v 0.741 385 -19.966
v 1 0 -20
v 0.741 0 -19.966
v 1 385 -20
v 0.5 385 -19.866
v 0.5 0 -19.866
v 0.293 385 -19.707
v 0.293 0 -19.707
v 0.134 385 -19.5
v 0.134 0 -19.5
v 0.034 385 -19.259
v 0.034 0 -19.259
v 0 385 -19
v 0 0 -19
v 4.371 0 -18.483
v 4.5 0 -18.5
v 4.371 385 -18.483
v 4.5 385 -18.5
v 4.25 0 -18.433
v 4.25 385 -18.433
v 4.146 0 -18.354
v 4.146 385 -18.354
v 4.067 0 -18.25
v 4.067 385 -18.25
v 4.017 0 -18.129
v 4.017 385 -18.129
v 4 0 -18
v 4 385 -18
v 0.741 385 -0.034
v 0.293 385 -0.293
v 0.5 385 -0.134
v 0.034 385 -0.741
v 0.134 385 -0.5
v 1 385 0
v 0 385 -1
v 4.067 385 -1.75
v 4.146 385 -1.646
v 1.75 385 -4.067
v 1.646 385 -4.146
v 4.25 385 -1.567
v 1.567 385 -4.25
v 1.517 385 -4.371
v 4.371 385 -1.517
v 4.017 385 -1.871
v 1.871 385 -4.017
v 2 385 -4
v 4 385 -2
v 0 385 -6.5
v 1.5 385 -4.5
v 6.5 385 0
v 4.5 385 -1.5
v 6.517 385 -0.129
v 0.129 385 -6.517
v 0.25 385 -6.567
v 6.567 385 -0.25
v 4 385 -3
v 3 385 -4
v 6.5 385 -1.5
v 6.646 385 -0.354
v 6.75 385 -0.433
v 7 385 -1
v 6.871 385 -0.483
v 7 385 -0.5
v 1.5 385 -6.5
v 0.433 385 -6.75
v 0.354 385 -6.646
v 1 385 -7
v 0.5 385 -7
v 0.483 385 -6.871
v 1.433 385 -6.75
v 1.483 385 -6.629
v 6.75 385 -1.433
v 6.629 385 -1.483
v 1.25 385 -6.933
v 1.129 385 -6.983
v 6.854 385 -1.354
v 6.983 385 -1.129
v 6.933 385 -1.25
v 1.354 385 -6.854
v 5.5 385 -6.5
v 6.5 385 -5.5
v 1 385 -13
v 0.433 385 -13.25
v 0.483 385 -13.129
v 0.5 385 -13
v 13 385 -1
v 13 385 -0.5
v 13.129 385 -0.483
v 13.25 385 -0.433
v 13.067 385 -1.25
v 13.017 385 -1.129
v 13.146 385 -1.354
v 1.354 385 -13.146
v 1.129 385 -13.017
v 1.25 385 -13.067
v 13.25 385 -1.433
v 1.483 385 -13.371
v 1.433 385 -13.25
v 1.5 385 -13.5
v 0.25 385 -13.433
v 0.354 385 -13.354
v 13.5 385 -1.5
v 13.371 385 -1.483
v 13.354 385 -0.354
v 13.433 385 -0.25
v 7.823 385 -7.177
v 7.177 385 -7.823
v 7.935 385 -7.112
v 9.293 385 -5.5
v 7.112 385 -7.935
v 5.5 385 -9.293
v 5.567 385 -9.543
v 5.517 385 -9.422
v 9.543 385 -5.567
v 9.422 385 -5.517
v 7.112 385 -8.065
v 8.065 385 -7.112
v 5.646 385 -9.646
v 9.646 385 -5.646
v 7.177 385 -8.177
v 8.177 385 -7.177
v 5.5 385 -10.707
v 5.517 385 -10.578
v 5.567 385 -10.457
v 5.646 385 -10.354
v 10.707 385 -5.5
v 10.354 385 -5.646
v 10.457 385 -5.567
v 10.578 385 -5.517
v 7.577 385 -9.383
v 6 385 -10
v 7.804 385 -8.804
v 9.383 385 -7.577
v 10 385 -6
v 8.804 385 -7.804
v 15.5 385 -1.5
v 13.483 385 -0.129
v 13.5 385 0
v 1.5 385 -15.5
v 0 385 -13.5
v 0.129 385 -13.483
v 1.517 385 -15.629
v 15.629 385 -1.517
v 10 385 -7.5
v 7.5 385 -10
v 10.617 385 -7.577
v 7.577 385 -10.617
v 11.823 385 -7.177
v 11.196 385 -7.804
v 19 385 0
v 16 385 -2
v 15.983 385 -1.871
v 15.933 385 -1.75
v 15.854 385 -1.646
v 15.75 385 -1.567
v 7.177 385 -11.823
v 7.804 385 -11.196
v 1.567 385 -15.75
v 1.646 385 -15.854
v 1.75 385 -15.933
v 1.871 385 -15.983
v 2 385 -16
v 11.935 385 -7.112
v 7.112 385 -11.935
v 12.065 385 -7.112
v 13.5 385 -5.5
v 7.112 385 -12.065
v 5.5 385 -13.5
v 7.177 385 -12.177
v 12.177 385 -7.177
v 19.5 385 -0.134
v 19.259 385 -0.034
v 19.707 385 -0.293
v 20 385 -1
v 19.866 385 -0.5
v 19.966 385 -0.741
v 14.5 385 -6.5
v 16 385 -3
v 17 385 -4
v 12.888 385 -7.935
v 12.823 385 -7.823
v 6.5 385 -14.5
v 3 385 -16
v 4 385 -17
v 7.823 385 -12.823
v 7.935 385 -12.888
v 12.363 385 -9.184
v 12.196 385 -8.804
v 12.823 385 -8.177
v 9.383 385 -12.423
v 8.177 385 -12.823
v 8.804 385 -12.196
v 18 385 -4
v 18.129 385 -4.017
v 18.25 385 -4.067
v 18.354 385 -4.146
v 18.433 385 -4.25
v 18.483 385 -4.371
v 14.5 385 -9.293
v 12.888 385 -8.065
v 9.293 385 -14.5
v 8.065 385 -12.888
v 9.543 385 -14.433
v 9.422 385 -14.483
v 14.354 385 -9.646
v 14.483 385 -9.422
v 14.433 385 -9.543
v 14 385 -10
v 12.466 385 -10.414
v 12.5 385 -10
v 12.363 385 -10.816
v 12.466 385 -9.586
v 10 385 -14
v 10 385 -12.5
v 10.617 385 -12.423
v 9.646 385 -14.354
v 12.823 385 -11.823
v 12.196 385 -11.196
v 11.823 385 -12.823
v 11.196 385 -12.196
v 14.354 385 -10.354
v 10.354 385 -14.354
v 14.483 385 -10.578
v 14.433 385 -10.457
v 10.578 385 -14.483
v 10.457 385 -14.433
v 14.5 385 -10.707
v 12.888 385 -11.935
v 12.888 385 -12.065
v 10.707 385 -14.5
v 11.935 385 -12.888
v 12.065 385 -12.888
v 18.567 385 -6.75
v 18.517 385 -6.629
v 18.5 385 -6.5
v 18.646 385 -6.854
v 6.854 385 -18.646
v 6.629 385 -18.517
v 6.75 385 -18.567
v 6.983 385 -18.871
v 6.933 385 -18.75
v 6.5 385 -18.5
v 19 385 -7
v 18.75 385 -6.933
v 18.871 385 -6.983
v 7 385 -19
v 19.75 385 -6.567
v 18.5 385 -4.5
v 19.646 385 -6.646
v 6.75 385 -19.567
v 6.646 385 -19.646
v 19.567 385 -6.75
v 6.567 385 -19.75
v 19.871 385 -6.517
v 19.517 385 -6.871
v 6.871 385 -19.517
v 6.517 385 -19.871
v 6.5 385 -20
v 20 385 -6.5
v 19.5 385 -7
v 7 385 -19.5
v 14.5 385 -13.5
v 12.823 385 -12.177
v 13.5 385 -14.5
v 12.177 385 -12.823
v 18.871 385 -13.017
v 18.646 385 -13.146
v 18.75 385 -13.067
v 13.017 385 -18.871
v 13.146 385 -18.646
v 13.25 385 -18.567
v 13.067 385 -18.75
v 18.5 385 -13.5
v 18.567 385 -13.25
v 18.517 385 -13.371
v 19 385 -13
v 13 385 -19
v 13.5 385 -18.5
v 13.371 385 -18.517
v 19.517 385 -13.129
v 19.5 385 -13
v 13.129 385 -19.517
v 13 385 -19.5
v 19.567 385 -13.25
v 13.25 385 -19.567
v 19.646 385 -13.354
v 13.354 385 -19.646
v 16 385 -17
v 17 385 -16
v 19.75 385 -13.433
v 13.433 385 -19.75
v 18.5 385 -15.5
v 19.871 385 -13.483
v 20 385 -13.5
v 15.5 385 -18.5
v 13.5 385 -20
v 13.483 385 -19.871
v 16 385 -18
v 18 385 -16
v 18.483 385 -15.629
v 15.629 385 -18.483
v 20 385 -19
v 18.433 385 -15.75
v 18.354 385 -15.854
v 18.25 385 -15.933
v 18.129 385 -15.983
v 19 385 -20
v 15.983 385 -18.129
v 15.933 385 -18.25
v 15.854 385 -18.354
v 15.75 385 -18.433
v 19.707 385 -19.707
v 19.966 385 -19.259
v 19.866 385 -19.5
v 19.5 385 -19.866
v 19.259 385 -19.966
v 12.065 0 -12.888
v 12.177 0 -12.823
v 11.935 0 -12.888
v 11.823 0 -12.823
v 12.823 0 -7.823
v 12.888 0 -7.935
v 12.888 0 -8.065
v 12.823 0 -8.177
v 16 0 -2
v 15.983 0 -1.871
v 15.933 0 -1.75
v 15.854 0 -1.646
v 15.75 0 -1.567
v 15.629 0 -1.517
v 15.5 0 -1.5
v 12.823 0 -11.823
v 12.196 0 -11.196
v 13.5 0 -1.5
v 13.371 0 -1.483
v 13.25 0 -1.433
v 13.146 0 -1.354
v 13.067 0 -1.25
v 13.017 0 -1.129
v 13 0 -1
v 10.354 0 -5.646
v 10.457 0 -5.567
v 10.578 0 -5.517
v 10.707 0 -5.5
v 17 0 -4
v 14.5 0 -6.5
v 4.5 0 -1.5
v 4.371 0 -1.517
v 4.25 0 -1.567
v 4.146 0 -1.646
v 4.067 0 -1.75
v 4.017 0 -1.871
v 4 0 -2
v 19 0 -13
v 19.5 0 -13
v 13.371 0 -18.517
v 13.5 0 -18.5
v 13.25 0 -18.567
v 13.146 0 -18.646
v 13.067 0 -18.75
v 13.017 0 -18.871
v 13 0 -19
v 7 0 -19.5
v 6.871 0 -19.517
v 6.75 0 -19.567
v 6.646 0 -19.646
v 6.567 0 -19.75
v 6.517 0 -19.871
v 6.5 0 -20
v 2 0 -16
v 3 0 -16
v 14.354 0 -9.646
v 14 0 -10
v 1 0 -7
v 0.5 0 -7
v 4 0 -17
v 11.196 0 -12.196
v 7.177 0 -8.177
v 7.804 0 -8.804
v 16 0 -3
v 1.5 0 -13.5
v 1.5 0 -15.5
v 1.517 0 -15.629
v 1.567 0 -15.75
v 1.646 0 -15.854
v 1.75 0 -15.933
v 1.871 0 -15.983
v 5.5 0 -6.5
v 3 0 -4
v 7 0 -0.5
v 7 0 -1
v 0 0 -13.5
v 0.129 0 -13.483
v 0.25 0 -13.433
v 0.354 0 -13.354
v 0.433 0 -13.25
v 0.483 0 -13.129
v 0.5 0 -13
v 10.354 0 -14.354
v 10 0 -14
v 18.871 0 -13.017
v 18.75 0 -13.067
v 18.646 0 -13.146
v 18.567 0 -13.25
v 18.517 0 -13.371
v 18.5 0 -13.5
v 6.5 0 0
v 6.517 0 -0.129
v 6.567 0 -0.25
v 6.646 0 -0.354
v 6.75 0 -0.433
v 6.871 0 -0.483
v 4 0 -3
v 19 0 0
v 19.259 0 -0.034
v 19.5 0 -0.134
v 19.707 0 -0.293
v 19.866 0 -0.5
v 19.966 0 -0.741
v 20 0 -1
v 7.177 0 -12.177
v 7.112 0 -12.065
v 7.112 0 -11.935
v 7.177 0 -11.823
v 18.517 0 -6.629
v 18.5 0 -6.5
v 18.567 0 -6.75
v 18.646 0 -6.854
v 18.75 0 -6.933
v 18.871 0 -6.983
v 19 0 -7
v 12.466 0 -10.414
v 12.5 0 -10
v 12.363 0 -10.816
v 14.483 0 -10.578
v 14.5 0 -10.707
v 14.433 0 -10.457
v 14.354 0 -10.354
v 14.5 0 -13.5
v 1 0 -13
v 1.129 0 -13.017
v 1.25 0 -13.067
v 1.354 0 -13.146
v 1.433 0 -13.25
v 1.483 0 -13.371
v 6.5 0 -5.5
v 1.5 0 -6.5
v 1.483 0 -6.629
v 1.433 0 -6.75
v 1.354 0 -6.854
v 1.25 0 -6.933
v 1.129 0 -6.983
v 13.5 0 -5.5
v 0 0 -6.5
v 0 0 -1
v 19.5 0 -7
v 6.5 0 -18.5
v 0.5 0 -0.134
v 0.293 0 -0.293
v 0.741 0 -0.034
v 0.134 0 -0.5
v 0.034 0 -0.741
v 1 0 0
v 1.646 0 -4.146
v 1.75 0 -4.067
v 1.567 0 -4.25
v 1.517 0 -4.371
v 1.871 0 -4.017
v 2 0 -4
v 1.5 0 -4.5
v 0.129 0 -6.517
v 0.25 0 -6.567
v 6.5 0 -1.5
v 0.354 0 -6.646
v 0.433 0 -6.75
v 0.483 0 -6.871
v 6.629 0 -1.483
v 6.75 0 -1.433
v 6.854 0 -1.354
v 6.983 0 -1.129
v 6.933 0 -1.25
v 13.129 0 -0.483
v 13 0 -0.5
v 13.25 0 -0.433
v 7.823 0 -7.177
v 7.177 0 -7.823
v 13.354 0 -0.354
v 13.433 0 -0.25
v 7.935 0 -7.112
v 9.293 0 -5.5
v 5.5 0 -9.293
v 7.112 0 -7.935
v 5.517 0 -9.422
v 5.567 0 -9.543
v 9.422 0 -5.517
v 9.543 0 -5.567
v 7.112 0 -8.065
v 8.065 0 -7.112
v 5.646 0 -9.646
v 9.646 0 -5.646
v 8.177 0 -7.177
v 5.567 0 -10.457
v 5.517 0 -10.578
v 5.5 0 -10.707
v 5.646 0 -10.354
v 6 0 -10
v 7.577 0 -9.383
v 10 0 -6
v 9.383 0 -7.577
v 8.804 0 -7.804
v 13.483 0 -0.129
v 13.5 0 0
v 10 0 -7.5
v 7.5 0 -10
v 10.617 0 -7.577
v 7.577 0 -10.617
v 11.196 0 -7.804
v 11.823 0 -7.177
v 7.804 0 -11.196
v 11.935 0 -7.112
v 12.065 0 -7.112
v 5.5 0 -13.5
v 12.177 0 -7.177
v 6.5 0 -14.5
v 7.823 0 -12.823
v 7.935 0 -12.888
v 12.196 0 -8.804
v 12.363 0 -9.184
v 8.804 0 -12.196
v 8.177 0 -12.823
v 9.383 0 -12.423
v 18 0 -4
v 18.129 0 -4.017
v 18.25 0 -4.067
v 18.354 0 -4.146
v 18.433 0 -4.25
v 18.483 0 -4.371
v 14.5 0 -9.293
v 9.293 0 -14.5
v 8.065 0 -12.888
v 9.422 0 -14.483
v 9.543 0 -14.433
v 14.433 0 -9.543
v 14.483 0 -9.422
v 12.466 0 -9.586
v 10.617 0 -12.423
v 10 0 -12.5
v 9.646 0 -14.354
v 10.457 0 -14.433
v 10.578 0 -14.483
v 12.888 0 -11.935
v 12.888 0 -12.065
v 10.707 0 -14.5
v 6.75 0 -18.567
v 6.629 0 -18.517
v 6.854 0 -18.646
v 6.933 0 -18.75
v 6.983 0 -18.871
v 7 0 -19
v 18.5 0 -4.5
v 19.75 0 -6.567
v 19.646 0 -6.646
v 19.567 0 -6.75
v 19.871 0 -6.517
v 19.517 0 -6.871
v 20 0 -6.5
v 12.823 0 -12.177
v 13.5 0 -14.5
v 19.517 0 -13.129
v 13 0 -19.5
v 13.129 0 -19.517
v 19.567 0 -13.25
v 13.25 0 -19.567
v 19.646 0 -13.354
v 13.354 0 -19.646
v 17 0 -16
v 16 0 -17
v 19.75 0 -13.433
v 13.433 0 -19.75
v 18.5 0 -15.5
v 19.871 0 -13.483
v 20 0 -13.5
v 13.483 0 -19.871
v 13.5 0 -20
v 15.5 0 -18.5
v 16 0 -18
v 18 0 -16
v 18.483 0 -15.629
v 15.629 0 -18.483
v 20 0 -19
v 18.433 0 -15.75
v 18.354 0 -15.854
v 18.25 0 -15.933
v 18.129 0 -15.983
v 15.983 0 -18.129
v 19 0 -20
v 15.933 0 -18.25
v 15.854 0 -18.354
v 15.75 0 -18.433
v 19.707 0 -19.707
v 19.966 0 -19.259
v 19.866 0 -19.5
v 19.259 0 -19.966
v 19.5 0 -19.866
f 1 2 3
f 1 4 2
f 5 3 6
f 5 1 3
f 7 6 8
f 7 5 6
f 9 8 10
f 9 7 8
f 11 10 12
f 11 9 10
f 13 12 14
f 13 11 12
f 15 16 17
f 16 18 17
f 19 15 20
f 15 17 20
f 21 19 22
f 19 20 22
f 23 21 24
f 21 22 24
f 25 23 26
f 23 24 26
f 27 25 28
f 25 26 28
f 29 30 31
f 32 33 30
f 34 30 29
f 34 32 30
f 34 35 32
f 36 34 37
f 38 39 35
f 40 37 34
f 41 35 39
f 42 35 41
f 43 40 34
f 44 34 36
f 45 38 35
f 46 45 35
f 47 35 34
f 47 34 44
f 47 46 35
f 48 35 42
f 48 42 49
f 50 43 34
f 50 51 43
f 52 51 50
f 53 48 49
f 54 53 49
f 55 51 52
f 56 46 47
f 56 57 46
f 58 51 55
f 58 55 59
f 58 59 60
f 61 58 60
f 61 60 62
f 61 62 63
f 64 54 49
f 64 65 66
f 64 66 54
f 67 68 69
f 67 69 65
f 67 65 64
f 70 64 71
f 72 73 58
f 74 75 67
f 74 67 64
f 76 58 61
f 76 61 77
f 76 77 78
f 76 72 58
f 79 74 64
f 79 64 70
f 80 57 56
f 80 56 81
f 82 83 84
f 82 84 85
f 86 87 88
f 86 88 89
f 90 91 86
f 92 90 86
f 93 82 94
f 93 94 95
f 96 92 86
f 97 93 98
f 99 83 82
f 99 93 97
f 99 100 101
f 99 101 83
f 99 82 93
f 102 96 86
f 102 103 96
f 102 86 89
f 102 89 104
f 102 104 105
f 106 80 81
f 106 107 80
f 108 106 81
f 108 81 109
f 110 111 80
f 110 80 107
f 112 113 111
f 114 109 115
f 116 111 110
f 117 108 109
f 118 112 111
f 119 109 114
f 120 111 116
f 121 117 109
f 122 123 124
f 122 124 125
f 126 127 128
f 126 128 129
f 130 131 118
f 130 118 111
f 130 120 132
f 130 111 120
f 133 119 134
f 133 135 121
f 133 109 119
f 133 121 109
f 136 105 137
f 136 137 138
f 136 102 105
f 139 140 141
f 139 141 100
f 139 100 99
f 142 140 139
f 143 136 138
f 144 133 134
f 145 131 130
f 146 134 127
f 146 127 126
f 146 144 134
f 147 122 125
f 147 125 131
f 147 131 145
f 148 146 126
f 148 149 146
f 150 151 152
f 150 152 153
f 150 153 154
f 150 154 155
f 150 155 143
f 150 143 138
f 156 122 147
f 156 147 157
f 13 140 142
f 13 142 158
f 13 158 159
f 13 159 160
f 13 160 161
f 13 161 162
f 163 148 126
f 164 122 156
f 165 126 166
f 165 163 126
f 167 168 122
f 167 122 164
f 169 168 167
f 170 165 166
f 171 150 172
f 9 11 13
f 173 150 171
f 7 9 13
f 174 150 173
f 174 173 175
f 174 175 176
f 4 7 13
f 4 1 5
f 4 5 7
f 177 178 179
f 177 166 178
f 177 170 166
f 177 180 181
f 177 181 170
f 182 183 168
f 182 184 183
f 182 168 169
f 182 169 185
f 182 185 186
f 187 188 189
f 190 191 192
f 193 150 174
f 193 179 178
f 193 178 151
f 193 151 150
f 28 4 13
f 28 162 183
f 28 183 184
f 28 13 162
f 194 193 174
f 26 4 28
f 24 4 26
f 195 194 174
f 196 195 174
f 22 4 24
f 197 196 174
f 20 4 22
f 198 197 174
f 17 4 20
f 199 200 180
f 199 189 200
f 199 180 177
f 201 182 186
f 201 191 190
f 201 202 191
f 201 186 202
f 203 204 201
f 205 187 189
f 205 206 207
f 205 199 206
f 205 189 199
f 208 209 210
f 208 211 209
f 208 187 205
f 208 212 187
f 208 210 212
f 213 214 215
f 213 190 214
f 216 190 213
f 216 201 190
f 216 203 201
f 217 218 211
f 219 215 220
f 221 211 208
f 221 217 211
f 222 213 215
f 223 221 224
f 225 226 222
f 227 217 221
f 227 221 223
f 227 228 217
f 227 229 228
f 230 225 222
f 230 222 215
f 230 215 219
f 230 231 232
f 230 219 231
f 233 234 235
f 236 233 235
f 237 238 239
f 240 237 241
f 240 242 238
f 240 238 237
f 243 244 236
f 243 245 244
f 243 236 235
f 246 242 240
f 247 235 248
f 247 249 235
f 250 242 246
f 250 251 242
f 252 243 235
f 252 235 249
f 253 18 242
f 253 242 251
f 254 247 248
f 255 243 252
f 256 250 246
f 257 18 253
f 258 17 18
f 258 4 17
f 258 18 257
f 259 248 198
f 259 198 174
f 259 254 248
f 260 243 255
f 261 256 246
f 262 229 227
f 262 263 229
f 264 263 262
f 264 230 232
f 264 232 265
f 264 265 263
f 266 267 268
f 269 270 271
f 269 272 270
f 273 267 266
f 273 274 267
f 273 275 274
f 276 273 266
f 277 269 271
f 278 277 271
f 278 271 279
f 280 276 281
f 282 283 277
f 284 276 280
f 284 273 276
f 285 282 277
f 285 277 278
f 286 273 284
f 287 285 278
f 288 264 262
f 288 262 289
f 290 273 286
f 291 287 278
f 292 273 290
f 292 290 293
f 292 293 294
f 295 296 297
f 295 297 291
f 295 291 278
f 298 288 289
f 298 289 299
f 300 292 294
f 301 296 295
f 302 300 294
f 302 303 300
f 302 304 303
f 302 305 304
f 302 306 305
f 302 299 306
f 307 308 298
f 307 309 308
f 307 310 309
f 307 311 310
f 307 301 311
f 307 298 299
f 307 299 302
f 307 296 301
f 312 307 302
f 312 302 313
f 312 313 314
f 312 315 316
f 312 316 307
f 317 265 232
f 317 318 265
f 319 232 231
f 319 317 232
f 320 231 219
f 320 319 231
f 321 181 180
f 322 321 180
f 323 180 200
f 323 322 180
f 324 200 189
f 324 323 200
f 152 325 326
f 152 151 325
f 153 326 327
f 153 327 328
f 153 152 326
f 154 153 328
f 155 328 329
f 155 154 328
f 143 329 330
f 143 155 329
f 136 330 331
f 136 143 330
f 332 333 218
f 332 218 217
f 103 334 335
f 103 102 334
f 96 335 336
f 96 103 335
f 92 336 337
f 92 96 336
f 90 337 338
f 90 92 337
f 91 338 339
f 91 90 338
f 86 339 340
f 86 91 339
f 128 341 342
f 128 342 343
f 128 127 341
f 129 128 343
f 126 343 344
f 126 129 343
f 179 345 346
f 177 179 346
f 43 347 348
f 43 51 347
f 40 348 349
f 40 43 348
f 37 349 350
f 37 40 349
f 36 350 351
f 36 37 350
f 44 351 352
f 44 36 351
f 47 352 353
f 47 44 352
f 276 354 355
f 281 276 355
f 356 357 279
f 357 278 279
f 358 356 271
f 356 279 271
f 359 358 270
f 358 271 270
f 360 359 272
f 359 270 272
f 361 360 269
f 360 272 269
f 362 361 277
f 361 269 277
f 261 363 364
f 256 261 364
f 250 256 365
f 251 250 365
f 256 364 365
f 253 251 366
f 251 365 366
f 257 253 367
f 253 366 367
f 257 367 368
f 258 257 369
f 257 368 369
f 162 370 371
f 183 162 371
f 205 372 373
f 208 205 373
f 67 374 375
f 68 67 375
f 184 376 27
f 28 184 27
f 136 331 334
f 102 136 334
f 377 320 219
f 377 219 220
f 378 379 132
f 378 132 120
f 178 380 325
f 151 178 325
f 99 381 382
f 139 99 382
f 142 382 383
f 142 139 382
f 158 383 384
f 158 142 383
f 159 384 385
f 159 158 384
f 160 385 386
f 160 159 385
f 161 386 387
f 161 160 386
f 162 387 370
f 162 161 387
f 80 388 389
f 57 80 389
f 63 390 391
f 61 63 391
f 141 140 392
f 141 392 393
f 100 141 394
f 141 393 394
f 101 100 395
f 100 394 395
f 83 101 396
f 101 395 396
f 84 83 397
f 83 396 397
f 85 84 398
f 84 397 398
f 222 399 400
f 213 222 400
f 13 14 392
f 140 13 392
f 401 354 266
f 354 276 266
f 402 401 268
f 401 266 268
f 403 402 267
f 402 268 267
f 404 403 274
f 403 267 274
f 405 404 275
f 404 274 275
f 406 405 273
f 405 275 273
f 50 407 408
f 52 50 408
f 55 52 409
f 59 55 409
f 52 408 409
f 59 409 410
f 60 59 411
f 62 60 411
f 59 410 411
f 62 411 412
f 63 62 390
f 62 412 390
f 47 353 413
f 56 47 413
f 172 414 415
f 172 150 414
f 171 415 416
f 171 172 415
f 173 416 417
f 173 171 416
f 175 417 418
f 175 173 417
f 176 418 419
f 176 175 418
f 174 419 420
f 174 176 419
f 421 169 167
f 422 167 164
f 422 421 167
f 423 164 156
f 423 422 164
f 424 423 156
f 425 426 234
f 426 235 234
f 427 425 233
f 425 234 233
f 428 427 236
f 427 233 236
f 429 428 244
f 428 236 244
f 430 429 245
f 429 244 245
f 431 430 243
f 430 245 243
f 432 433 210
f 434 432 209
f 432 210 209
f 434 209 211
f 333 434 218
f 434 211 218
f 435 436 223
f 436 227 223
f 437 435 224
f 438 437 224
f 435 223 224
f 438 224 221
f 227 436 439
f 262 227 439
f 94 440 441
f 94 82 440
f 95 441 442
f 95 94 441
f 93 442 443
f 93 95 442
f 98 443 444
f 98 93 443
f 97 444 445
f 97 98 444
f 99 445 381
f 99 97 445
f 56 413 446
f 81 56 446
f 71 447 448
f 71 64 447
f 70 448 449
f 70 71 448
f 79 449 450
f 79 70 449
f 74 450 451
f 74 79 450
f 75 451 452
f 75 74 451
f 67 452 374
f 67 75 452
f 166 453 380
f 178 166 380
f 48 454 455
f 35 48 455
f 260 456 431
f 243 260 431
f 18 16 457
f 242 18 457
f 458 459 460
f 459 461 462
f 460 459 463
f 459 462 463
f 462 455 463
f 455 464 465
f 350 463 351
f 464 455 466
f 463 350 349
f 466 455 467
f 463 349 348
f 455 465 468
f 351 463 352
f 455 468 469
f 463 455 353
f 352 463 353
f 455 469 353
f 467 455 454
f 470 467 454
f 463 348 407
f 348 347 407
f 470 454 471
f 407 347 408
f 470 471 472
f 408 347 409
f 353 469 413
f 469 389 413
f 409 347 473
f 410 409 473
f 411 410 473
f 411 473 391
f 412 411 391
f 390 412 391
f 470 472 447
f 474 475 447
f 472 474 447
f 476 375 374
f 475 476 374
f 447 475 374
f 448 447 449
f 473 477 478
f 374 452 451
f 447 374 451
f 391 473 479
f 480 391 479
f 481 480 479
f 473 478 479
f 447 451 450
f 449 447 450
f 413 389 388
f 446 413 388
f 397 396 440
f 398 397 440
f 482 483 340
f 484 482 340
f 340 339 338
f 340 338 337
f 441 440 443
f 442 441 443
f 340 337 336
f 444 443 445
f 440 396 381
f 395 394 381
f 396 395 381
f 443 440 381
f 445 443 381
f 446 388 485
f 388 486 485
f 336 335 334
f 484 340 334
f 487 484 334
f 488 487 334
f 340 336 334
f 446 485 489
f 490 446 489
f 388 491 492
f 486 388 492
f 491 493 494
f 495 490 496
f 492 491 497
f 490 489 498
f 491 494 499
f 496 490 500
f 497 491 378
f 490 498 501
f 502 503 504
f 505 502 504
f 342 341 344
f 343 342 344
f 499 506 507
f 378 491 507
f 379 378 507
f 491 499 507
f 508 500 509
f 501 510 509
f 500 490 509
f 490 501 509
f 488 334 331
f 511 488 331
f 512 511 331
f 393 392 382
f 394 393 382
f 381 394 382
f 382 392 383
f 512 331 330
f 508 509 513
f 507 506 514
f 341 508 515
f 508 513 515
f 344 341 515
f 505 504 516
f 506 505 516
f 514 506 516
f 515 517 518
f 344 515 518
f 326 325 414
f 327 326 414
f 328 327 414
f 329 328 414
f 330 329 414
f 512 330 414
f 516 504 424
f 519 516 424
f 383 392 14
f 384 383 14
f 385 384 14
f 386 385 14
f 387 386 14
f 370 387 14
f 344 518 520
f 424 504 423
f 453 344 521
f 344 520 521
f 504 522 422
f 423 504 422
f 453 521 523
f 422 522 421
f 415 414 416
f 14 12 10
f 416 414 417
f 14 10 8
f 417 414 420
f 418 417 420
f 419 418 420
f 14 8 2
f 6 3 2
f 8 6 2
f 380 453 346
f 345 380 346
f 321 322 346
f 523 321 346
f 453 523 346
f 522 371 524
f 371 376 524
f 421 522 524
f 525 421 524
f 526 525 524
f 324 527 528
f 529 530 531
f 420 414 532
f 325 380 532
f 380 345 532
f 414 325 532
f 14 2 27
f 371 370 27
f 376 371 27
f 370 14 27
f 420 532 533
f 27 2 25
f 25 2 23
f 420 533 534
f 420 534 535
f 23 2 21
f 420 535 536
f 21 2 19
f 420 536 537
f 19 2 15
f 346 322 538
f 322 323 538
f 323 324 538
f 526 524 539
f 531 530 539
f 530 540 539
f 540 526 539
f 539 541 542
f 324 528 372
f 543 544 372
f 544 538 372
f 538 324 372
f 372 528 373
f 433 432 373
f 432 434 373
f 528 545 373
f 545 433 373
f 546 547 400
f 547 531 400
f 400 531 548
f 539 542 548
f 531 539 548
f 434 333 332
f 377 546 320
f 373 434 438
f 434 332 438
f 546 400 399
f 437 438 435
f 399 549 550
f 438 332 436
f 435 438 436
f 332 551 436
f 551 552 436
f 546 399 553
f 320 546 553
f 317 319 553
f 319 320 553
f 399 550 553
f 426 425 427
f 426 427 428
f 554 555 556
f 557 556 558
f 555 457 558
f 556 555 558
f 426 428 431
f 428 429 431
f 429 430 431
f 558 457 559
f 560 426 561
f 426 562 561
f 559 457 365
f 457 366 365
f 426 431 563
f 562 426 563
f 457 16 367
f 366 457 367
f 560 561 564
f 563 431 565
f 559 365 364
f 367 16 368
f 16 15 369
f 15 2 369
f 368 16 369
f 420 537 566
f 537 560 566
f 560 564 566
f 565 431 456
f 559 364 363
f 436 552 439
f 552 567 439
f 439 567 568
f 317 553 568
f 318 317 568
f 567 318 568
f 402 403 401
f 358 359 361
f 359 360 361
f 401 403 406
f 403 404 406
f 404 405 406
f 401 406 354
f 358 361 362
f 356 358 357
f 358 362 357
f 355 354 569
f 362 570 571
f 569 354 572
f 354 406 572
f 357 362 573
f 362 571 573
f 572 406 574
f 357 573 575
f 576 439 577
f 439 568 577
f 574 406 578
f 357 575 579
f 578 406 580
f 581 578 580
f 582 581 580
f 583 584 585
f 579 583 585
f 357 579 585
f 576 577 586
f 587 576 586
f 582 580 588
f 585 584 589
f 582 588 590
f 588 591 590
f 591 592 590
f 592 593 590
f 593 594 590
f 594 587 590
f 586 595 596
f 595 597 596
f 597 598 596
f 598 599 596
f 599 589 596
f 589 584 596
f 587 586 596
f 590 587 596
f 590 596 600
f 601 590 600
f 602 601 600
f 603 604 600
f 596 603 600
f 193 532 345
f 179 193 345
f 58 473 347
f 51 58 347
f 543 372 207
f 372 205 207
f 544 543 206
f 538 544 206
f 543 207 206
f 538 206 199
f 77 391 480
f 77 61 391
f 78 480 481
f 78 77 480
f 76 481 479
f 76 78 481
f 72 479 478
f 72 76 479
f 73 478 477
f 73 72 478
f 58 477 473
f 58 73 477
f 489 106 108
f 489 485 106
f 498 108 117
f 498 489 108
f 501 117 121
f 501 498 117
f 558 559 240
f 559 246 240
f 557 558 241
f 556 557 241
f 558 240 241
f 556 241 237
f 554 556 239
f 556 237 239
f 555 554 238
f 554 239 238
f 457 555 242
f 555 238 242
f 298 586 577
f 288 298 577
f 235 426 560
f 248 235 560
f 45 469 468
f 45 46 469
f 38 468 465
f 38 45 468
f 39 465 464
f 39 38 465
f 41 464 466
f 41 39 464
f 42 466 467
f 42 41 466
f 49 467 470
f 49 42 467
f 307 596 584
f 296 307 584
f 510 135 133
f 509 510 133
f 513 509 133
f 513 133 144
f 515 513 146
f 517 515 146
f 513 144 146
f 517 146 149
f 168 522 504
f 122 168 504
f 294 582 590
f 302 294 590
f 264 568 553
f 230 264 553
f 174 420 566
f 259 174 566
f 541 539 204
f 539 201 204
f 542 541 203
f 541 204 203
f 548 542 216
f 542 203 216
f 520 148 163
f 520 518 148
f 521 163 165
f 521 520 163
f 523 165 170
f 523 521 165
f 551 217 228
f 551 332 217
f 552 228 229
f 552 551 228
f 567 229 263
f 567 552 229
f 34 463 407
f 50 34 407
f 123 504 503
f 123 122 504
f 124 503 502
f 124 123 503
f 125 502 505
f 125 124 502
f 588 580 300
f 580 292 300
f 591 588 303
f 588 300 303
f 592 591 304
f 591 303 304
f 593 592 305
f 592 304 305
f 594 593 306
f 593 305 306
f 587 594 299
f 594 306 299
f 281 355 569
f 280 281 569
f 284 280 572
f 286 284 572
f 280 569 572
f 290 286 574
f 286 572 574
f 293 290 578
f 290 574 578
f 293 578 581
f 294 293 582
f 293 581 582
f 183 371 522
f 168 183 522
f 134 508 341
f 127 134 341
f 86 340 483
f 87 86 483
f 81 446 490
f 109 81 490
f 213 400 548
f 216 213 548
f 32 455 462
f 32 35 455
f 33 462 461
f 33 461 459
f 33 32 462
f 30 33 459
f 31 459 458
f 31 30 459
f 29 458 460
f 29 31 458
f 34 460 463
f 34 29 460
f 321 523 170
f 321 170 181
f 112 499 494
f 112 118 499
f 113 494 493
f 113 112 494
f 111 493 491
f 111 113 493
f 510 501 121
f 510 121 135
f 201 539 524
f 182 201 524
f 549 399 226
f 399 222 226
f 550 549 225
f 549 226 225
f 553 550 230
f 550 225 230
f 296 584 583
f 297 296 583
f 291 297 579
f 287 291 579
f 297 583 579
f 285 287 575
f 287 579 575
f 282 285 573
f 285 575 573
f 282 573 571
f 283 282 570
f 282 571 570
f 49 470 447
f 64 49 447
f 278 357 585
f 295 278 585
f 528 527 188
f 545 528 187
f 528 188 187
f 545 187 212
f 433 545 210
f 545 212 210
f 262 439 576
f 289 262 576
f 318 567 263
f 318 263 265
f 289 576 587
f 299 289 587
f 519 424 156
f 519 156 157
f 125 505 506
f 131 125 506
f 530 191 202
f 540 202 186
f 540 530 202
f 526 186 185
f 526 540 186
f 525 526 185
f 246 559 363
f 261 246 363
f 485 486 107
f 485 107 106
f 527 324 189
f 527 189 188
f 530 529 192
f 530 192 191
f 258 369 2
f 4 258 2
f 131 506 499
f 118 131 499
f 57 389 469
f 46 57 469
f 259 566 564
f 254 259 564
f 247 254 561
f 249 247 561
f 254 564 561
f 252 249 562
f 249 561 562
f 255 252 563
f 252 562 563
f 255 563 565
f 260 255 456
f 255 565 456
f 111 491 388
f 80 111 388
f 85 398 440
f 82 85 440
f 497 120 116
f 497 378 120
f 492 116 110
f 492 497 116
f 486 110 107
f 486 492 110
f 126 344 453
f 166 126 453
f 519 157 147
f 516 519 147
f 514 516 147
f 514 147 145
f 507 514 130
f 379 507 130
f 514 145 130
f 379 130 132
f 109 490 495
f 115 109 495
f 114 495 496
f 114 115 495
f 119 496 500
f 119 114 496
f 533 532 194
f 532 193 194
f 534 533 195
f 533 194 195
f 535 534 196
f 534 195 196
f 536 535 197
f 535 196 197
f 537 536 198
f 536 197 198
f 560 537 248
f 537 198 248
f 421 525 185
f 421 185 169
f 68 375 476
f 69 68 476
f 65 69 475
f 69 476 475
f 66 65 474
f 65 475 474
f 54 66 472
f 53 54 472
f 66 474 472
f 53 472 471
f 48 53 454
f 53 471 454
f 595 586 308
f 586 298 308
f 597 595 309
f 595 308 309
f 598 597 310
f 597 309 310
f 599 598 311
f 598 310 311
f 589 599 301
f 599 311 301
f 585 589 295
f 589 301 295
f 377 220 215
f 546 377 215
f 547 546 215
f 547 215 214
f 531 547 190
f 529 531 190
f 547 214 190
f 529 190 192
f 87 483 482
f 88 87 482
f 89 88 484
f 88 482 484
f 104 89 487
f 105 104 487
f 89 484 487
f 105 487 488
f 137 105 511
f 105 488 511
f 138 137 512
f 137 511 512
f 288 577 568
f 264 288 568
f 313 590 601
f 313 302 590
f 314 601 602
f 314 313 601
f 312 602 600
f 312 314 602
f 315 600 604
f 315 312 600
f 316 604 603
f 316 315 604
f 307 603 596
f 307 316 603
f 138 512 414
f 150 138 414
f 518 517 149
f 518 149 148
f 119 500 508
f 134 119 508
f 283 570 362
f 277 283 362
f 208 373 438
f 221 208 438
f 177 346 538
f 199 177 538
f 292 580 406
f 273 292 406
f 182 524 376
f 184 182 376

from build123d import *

# Parameters (mm, degrees)
BOSS_EXTRUDE1_DEPTH = 385
FILLET1_R           = 1
CUT_EXTRUDE1_DEPTH  = 386
FILLET2_R           = 0.5
FILLET3_R           = 0.25


with BuildPart() as part:
    # Sketch3 → Boss-Extrude1 (new body)
    with BuildSketch(Plane(origin=(0, 0, 0), x_dir=(1, 0, 0), z_dir=(0, 1, 0))):
        with BuildLine():
            Line((7, 18.5), (7, 19.5))
            ThreePointArc((7, 19.5), (6.646446609, 19.646446609), (6.5, 20))
            Line((6.5, 20), (0, 20))
            Line((0, 20), (0, 13.5))
            ThreePointArc((0, 13.5), (0.353553391, 13.353553391), (0.5, 13))
            Line((0.5, 13), (1.5, 13))
            Line((1.5, 13), (1.5, 16))
            Line((1.5, 16), (3, 16))
            Line((3, 16), (5.5, 13.5))
            Line((5.5, 13.5), (5.5, 10.5))
            Line((5.5, 10.5), (6, 10))
            Line((6, 10), (5.5, 9.5))
            Line((5.5, 9.5), (5.5, 6.5))
            Line((5.5, 6.5), (3, 4))
            Line((3, 4), (1.5, 4))
            Line((1.5, 4), (1.5, 7))
            Line((1.5, 7), (0.5, 7))
            ThreePointArc((0.5, 7), (0.353553391, 6.646446609), (0, 6.5))
            Line((0, 6.5), (0, 0))
            Line((0, 0), (6.5, 0))
            ThreePointArc((6.5, 0), (6.646446609, 0.353553391), (7, 0.5))
            Line((7, 0.5), (7, 1.5))
            Line((7, 1.5), (4, 1.5))
            Line((4, 1.5), (4, 3))
            Line((4, 3), (6.5, 5.5))
            Line((6.5, 5.5), (9.5, 5.5))
            Line((9.5, 5.5), (10, 6))
            Line((10, 6), (10.5, 5.5))
            Line((10.5, 5.5), (13.5, 5.5))
            Line((13.5, 5.5), (16, 3))
            Line((16, 3), (16, 1.5))
            Line((16, 1.5), (13, 1.5))
            Line((13, 1.5), (13, 0.5))
            ThreePointArc((13, 0.5), (13.353553391, 0.353553391), (13.5, 0))
            Line((13.5, 0), (20, 0))
            Line((20, 0), (20, 6.5))
            ThreePointArc((20, 6.5), (19.646446609, 6.646446609), (19.5, 7))
            Line((19.5, 7), (18.5, 7))
            Line((18.5, 7), (18.5, 4))
            Line((18.5, 4), (17, 4))
            Line((17, 4), (14.5, 6.5))
            Line((14.5, 6.5), (14.5, 9.5))
            Line((14.5, 9.5), (14, 10))
            Line((14, 10), (14.5, 10.5))
            Line((14.5, 10.5), (14.5, 13.5))
            Line((14.5, 13.5), (17, 16))
            Line((17, 16), (18.5, 16))
            Line((18.5, 16), (18.5, 13))
            Line((18.5, 13), (19.5, 13))
            ThreePointArc((19.5, 13), (19.646446609, 13.353553391), (20, 13.5))
            Line((20, 13.5), (20, 20))
            Line((20, 20), (13.5, 20))
            ThreePointArc((13.5, 20), (13.353553391, 19.646446609), (13, 19.5))
            Line((13, 19.5), (13, 18.5))
            Line((13, 18.5), (16, 18.5))
            Line((16, 18.5), (16, 17))
            Line((16, 17), (13.5, 14.5))
            Line((13.5, 14.5), (10.5, 14.5))
            Line((10.5, 14.5), (10, 14))
            Line((10, 14), (9.5, 14.5))
            Line((9.5, 14.5), (6.5, 14.5))
            Line((6.5, 14.5), (4, 17))
            Line((4, 17), (4, 18.5))
            Line((4, 18.5), (7, 18.5))
        make_face()
    extrude(amount=BOSS_EXTRUDE1_DEPTH)

    # Fillet1
    fillet1_edges = [part.edges().sort_by_distance(p)[0] for p in [
        (20, 192.5, 0),
        (0, 192.5, 0),
        (0, 192.5, -20),
        (20, 192.5, -20),
    ]]
    fillet(fillet1_edges, radius=FILLET1_R)

    # Sketch4 → Cut-Extrude1 (cut, through all)
    with BuildSketch(Plane(origin=(0, 385, 0), x_dir=(1, 0, 0), z_dir=(0, 1, 0))):
        with BuildLine():
            Line((10, 11), (11.195582496, 12.195582496))
            ThreePointArc((11.195582496, 12.195582496), (10, 12.5), (8.804417504, 12.195582496))
            Line((8.804417504, 12.195582496), (10, 11))
        make_face()
        with BuildLine():
            ThreePointArc((12.195582496, 11.195582496), (11.767766953, 11.767766953), (11.195582496, 12.195582496))
            Line((11.195582496, 12.195582496), (10, 11))
            Line((10, 11), (11, 10))
            Line((11, 10), (12.195582496, 11.195582496))
        make_face()
        with BuildLine():
            Line((9, 10), (10, 11))
            Line((10, 11), (8.804417504, 12.195582496))
            ThreePointArc((8.804417504, 12.195582496), (8.232233047, 11.767766953), (7.804417504, 11.195582496))
            Line((7.804417504, 11.195582496), (9, 10))
        make_face()
        Polygon((11, 10), (10, 11), (9, 10), (10, 9), align=None)
        with BuildLine():
            Line((7.804417504, 8.804417504), (9, 10))
            Line((9, 10), (7.804417504, 11.195582496))
            ThreePointArc((7.804417504, 11.195582496), (7.5, 10), (7.804417504, 8.804417504))
        make_face()
        with BuildLine():
            Line((10, 9), (9, 10))
            Line((9, 10), (7.804417504, 8.804417504))
            ThreePointArc((7.804417504, 8.804417504), (8.232233047, 8.232233047), (8.804417504, 7.804417504))
            Line((8.804417504, 7.804417504), (10, 9))
        make_face()
        with BuildLine():
            Line((11.195582496, 7.804417504), (10, 9))
            Line((10, 9), (8.804417504, 7.804417504))
            ThreePointArc((8.804417504, 7.804417504), (10, 7.5), (11.195582496, 7.804417504))
        make_face()
        with BuildLine():
            Line((12.195582496, 8.804417504), (11, 10))
            Line((11, 10), (10, 9))
            Line((10, 9), (11.195582496, 7.804417504))
            ThreePointArc((11.195582496, 7.804417504), (11.767766953, 8.232233047), (12.195582496, 8.804417504))
        make_face()
        with BuildLine():
            ThreePointArc((12.5, 10), (12.422700584, 10.616864556), (12.195582496, 11.195582496))
            Line((12.195582496, 11.195582496), (11, 10))
            Line((11, 10), (12.195582496, 8.804417504))
            ThreePointArc((12.195582496, 8.804417504), (12.422700584, 9.383135444), (12.5, 10))
        make_face()
        with BuildLine():
            ThreePointArc((8.804417504, 7.804417504), (8.232233047, 8.232233047), (7.804417504, 8.804417504))
            Line((7.804417504, 8.804417504), (7, 8))
            Line((7, 8), (8, 7))
            Line((8, 7), (8.804417504, 7.804417504))
        make_face()
        with BuildLine():
            Line((13, 8), (12.195582496, 8.804417504))
            ThreePointArc((12.195582496, 8.804417504), (11.767766953, 8.232233047), (11.195582496, 7.804417504))
            Line((11.195582496, 7.804417504), (12, 7))
            Line((12, 7), (13, 8))
        make_face()
        with BuildLine():
            Line((13, 12), (12, 13))
            Line((12, 13), (11.195582496, 12.195582496))
            ThreePointArc((11.195582496, 12.195582496), (11.767766953, 11.767766953), (12.195582496, 11.195582496))
            Line((12.195582496, 11.195582496), (13, 12))
        make_face()
        with BuildLine():
            ThreePointArc((7.804417504, 11.195582496), (8.232233047, 11.767766953), (8.804417504, 12.195582496))
            Line((8.804417504, 12.195582496), (8, 13))
            Line((8, 13), (7, 12))
            Line((7, 12), (7.804417504, 11.195582496))
        make_face()
    extrude(amount=-CUT_EXTRUDE1_DEPTH, mode=Mode.SUBTRACT)

    # Fillet2
    fillet2_edges = [part.edges().sort_by_distance(p)[0] for p in [
        (18.5, 192.5, -13),
        (18.5, 192.5, -16),
        (14.5, 192.5, -10.5),
        (14.5, 192.5, -9.5),
        (18.5, 192.5, -4),
        (18.5, 192.5, -7),
        (13, 192.5, -1.5),
        (16, 192.5, -1.5),
        (10.5, 192.5, -5.5),
        (9.5, 192.5, -5.5),
        (4, 192.5, -1.5),
        (7, 192.5, -1.5),
        (1.5, 192.5, -7),
        (1.5, 192.5, -4),
        (5.5, 192.5, -9.5),
        (5.5, 192.5, -10.5),
        (1.5, 192.5, -16),
        (1.5, 192.5, -13),
        (7, 192.5, -18.5),
        (4, 192.5, -18.5),
        (9.5, 192.5, -14.5),
        (10.5, 192.5, -14.5),
        (16, 192.5, -18.5),
        (13, 192.5, -18.5),
    ]]
    fillet(fillet2_edges, radius=FILLET2_R)

    # Fillet3
    fillet3_edges = [part.edges().sort_by_distance(p)[0] for p in [
        (7, 192.5, -12),
        (8, 192.5, -13),
        (12, 192.5, -13),
        (13, 192.5, -12),
        (13, 192.5, -8),
        (12, 192.5, -7),
        (8, 192.5, -7),
        (7, 192.5, -8),
    ]]
    fillet(fillet3_edges, radius=FILLET3_R)


solid = part.part
